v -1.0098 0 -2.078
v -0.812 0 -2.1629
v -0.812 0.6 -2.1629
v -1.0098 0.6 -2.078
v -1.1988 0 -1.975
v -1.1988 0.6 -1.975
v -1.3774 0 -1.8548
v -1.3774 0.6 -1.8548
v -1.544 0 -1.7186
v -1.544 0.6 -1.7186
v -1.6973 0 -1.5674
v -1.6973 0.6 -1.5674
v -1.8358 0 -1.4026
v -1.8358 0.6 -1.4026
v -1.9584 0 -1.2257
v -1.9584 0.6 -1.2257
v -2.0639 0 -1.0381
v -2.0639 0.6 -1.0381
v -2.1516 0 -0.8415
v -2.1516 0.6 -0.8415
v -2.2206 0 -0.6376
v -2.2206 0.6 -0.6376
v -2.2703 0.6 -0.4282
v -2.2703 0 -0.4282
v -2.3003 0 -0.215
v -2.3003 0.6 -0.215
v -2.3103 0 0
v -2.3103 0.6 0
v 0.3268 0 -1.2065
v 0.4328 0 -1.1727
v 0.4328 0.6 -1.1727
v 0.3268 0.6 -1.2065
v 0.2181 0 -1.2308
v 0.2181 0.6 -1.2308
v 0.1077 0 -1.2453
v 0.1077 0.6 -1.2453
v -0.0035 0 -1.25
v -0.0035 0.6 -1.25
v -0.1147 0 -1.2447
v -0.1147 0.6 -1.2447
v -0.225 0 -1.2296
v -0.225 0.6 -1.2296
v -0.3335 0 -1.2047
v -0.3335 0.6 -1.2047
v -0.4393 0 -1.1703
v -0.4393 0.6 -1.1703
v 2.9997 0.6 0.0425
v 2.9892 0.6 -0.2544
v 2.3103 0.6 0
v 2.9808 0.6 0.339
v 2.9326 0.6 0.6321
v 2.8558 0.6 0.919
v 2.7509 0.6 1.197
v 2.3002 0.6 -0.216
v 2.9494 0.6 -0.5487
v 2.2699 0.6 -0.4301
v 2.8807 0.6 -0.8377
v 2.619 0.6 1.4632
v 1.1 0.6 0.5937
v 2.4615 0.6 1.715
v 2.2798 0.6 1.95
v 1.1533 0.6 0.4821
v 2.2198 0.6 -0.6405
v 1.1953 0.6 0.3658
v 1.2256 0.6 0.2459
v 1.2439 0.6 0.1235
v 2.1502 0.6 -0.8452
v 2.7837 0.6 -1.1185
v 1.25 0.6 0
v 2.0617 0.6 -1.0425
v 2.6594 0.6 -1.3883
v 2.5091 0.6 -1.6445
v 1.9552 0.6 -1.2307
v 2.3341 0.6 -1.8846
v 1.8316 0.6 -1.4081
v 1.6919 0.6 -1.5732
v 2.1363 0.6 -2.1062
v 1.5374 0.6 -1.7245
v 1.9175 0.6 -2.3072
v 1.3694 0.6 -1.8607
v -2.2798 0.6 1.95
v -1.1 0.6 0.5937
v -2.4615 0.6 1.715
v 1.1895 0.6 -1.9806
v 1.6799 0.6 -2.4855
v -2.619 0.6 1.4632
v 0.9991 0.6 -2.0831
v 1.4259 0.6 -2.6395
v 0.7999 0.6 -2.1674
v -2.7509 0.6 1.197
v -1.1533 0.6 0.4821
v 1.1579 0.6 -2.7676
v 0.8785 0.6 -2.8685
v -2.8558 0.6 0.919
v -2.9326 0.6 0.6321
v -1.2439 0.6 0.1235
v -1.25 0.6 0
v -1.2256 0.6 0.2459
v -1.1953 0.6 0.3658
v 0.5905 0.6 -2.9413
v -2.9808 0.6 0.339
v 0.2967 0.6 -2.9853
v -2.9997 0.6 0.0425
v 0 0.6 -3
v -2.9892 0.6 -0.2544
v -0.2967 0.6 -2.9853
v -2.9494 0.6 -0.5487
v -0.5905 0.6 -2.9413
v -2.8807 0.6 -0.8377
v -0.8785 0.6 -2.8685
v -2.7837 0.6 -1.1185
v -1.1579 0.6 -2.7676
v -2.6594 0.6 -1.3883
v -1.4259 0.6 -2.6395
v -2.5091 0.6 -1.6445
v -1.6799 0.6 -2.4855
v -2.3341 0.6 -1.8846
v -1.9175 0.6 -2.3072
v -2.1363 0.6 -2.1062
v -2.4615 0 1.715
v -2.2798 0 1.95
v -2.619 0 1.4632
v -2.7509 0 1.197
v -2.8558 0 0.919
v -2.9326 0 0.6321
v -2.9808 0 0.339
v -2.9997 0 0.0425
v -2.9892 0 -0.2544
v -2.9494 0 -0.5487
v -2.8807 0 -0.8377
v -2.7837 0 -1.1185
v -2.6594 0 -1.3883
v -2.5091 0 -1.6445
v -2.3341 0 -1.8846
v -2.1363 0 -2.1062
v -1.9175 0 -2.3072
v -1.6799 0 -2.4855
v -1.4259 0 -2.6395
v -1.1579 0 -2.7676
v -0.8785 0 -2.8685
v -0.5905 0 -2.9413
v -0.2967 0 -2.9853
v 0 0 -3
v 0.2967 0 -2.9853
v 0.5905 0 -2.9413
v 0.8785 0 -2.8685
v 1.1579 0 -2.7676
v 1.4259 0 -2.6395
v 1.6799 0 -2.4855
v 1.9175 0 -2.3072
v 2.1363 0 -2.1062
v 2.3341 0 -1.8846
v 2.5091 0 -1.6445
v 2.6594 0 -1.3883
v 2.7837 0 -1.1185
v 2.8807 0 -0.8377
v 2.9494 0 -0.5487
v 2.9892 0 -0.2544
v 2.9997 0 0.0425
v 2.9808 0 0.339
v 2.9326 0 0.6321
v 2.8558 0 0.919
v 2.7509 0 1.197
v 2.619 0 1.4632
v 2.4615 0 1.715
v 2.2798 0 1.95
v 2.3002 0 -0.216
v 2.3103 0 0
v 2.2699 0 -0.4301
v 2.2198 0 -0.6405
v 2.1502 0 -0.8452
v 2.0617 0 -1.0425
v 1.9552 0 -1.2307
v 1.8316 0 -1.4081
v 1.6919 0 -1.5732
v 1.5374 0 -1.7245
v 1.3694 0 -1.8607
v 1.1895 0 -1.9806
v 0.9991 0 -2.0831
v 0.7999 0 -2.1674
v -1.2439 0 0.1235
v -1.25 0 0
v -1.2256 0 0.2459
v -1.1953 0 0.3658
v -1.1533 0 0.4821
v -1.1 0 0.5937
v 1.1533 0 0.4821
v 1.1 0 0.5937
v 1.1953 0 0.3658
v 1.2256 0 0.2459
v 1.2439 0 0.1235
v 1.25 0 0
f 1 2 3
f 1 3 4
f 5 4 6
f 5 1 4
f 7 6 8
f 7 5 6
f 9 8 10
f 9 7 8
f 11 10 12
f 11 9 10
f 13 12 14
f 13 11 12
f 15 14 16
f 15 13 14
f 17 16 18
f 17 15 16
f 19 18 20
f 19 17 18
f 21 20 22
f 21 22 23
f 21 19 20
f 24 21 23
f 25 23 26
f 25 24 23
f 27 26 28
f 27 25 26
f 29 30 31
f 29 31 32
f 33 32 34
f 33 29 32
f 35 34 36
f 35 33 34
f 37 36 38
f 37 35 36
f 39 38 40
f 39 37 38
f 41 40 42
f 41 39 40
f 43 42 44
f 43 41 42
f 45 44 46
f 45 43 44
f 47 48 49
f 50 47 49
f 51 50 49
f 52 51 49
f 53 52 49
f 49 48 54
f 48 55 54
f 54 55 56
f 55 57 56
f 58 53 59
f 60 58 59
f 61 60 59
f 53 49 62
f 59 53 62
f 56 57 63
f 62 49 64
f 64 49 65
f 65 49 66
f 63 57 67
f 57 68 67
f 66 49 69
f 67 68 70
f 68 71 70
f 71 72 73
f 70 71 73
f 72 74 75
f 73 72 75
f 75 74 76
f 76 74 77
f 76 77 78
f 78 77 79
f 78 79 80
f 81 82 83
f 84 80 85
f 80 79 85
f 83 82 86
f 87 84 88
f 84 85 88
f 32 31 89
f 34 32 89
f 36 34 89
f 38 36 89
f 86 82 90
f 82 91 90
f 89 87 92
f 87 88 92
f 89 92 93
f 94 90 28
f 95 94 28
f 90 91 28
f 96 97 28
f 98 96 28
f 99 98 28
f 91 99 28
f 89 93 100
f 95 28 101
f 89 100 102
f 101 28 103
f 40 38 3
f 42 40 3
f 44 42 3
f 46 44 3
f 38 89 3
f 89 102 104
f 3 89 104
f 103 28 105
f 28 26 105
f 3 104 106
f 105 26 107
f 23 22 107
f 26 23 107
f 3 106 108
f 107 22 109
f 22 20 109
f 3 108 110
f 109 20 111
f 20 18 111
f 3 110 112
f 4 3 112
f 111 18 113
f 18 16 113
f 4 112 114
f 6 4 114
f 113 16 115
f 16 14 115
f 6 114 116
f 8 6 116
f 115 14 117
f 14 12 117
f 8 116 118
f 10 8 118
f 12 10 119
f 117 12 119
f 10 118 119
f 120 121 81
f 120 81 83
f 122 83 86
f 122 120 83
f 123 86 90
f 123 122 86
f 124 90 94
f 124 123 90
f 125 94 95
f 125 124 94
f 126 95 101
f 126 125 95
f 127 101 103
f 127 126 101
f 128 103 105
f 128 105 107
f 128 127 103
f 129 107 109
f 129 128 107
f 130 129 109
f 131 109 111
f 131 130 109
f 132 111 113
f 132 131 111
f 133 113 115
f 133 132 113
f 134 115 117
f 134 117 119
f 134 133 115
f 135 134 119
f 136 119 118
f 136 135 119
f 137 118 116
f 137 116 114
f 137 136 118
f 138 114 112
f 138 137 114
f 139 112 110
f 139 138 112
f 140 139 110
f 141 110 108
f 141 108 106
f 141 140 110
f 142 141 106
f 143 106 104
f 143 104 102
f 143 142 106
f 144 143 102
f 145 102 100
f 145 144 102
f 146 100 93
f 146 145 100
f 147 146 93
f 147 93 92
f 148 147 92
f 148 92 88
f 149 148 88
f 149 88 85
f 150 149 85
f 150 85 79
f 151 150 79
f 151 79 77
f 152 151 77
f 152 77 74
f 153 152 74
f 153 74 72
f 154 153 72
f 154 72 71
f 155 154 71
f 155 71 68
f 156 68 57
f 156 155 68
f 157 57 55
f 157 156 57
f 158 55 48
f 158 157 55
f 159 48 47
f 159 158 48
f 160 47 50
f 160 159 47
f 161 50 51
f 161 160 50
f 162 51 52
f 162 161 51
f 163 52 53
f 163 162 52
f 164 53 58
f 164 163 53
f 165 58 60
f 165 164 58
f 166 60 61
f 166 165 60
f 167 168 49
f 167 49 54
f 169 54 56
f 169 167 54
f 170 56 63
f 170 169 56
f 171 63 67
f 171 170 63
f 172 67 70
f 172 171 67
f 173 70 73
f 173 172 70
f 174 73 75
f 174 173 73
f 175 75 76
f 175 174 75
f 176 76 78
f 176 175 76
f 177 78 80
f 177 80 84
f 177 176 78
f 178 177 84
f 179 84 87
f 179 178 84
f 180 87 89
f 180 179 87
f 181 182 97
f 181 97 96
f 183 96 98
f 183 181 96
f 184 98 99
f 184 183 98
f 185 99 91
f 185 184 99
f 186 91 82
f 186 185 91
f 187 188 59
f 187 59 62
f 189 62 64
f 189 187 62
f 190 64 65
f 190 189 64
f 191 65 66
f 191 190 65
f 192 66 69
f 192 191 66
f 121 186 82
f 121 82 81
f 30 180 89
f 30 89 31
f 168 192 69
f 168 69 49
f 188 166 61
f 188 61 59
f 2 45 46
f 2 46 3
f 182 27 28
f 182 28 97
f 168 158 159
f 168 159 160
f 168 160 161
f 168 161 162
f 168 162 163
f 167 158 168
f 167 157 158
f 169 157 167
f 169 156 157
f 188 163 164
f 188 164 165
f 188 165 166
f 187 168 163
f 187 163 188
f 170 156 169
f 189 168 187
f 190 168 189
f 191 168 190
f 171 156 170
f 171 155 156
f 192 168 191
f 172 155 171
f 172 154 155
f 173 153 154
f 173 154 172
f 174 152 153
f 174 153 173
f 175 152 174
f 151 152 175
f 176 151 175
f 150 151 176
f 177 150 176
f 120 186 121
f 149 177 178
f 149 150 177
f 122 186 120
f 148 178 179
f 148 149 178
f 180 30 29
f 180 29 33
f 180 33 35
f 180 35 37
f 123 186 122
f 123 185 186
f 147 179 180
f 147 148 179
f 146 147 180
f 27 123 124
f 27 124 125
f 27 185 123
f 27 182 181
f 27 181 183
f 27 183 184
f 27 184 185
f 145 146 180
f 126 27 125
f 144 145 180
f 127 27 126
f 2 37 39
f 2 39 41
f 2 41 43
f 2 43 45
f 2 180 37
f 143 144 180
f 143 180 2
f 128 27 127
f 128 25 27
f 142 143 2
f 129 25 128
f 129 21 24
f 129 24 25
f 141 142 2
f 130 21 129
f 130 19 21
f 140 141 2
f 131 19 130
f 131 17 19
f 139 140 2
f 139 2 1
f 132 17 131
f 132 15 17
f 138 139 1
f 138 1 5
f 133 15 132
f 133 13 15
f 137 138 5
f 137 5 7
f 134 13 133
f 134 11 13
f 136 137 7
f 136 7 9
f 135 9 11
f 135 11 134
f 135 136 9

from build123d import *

# Parameters (mm, degrees)
EXTRUDE_1_DEPTH = 0.6


with BuildPart() as part:
    # 草图1 → 凸台-拉伸1 (new body)
    with BuildSketch(Plane(origin=(0, 0, 0), x_dir=(1, 0, 0), z_dir=(0, 1, 0))):
        with BuildLine():
            Line((-1.1, -0.593717104), (-2.279775485, -1.950031727))
            ThreePointArc((-2.279775485, -1.950031727), (0, 3), (2.279775485, -1.950031727))
            Line((2.279775485, -1.950031727), (1.1, -0.593717104))
            ThreePointArc((1.1, -0.593717104), (1.211919964, -0.306186218), (1.25, 0))
            Line((1.25, 0), (2.310308518, 0))
            ThreePointArc((2.310308518, 0), (1.895473318, 1.320873328), (0.799941971, 2.167398968))
            Line((0.799941971, 2.167398968), (0.432811227, 1.17267832))
            ThreePointArc((0.432811227, 1.17267832), (-0.003479103, 1.249995158), (-0.439332285, 1.170250889))
            Line((-0.439332285, 1.170250889), (-0.811994497, 2.162912477))
            ThreePointArc((-0.811994497, 2.162912477), (-1.899142339, 1.315592574), (-2.310308518, 0))
            Line((-2.310308518, 0), (-1.25, 0))
            ThreePointArc((-1.25, 0), (-1.211919964, -0.306186218), (-1.1, -0.593717104))
        make_face()
    extrude(amount=EXTRUDE_1_DEPTH)


solid = part.part
